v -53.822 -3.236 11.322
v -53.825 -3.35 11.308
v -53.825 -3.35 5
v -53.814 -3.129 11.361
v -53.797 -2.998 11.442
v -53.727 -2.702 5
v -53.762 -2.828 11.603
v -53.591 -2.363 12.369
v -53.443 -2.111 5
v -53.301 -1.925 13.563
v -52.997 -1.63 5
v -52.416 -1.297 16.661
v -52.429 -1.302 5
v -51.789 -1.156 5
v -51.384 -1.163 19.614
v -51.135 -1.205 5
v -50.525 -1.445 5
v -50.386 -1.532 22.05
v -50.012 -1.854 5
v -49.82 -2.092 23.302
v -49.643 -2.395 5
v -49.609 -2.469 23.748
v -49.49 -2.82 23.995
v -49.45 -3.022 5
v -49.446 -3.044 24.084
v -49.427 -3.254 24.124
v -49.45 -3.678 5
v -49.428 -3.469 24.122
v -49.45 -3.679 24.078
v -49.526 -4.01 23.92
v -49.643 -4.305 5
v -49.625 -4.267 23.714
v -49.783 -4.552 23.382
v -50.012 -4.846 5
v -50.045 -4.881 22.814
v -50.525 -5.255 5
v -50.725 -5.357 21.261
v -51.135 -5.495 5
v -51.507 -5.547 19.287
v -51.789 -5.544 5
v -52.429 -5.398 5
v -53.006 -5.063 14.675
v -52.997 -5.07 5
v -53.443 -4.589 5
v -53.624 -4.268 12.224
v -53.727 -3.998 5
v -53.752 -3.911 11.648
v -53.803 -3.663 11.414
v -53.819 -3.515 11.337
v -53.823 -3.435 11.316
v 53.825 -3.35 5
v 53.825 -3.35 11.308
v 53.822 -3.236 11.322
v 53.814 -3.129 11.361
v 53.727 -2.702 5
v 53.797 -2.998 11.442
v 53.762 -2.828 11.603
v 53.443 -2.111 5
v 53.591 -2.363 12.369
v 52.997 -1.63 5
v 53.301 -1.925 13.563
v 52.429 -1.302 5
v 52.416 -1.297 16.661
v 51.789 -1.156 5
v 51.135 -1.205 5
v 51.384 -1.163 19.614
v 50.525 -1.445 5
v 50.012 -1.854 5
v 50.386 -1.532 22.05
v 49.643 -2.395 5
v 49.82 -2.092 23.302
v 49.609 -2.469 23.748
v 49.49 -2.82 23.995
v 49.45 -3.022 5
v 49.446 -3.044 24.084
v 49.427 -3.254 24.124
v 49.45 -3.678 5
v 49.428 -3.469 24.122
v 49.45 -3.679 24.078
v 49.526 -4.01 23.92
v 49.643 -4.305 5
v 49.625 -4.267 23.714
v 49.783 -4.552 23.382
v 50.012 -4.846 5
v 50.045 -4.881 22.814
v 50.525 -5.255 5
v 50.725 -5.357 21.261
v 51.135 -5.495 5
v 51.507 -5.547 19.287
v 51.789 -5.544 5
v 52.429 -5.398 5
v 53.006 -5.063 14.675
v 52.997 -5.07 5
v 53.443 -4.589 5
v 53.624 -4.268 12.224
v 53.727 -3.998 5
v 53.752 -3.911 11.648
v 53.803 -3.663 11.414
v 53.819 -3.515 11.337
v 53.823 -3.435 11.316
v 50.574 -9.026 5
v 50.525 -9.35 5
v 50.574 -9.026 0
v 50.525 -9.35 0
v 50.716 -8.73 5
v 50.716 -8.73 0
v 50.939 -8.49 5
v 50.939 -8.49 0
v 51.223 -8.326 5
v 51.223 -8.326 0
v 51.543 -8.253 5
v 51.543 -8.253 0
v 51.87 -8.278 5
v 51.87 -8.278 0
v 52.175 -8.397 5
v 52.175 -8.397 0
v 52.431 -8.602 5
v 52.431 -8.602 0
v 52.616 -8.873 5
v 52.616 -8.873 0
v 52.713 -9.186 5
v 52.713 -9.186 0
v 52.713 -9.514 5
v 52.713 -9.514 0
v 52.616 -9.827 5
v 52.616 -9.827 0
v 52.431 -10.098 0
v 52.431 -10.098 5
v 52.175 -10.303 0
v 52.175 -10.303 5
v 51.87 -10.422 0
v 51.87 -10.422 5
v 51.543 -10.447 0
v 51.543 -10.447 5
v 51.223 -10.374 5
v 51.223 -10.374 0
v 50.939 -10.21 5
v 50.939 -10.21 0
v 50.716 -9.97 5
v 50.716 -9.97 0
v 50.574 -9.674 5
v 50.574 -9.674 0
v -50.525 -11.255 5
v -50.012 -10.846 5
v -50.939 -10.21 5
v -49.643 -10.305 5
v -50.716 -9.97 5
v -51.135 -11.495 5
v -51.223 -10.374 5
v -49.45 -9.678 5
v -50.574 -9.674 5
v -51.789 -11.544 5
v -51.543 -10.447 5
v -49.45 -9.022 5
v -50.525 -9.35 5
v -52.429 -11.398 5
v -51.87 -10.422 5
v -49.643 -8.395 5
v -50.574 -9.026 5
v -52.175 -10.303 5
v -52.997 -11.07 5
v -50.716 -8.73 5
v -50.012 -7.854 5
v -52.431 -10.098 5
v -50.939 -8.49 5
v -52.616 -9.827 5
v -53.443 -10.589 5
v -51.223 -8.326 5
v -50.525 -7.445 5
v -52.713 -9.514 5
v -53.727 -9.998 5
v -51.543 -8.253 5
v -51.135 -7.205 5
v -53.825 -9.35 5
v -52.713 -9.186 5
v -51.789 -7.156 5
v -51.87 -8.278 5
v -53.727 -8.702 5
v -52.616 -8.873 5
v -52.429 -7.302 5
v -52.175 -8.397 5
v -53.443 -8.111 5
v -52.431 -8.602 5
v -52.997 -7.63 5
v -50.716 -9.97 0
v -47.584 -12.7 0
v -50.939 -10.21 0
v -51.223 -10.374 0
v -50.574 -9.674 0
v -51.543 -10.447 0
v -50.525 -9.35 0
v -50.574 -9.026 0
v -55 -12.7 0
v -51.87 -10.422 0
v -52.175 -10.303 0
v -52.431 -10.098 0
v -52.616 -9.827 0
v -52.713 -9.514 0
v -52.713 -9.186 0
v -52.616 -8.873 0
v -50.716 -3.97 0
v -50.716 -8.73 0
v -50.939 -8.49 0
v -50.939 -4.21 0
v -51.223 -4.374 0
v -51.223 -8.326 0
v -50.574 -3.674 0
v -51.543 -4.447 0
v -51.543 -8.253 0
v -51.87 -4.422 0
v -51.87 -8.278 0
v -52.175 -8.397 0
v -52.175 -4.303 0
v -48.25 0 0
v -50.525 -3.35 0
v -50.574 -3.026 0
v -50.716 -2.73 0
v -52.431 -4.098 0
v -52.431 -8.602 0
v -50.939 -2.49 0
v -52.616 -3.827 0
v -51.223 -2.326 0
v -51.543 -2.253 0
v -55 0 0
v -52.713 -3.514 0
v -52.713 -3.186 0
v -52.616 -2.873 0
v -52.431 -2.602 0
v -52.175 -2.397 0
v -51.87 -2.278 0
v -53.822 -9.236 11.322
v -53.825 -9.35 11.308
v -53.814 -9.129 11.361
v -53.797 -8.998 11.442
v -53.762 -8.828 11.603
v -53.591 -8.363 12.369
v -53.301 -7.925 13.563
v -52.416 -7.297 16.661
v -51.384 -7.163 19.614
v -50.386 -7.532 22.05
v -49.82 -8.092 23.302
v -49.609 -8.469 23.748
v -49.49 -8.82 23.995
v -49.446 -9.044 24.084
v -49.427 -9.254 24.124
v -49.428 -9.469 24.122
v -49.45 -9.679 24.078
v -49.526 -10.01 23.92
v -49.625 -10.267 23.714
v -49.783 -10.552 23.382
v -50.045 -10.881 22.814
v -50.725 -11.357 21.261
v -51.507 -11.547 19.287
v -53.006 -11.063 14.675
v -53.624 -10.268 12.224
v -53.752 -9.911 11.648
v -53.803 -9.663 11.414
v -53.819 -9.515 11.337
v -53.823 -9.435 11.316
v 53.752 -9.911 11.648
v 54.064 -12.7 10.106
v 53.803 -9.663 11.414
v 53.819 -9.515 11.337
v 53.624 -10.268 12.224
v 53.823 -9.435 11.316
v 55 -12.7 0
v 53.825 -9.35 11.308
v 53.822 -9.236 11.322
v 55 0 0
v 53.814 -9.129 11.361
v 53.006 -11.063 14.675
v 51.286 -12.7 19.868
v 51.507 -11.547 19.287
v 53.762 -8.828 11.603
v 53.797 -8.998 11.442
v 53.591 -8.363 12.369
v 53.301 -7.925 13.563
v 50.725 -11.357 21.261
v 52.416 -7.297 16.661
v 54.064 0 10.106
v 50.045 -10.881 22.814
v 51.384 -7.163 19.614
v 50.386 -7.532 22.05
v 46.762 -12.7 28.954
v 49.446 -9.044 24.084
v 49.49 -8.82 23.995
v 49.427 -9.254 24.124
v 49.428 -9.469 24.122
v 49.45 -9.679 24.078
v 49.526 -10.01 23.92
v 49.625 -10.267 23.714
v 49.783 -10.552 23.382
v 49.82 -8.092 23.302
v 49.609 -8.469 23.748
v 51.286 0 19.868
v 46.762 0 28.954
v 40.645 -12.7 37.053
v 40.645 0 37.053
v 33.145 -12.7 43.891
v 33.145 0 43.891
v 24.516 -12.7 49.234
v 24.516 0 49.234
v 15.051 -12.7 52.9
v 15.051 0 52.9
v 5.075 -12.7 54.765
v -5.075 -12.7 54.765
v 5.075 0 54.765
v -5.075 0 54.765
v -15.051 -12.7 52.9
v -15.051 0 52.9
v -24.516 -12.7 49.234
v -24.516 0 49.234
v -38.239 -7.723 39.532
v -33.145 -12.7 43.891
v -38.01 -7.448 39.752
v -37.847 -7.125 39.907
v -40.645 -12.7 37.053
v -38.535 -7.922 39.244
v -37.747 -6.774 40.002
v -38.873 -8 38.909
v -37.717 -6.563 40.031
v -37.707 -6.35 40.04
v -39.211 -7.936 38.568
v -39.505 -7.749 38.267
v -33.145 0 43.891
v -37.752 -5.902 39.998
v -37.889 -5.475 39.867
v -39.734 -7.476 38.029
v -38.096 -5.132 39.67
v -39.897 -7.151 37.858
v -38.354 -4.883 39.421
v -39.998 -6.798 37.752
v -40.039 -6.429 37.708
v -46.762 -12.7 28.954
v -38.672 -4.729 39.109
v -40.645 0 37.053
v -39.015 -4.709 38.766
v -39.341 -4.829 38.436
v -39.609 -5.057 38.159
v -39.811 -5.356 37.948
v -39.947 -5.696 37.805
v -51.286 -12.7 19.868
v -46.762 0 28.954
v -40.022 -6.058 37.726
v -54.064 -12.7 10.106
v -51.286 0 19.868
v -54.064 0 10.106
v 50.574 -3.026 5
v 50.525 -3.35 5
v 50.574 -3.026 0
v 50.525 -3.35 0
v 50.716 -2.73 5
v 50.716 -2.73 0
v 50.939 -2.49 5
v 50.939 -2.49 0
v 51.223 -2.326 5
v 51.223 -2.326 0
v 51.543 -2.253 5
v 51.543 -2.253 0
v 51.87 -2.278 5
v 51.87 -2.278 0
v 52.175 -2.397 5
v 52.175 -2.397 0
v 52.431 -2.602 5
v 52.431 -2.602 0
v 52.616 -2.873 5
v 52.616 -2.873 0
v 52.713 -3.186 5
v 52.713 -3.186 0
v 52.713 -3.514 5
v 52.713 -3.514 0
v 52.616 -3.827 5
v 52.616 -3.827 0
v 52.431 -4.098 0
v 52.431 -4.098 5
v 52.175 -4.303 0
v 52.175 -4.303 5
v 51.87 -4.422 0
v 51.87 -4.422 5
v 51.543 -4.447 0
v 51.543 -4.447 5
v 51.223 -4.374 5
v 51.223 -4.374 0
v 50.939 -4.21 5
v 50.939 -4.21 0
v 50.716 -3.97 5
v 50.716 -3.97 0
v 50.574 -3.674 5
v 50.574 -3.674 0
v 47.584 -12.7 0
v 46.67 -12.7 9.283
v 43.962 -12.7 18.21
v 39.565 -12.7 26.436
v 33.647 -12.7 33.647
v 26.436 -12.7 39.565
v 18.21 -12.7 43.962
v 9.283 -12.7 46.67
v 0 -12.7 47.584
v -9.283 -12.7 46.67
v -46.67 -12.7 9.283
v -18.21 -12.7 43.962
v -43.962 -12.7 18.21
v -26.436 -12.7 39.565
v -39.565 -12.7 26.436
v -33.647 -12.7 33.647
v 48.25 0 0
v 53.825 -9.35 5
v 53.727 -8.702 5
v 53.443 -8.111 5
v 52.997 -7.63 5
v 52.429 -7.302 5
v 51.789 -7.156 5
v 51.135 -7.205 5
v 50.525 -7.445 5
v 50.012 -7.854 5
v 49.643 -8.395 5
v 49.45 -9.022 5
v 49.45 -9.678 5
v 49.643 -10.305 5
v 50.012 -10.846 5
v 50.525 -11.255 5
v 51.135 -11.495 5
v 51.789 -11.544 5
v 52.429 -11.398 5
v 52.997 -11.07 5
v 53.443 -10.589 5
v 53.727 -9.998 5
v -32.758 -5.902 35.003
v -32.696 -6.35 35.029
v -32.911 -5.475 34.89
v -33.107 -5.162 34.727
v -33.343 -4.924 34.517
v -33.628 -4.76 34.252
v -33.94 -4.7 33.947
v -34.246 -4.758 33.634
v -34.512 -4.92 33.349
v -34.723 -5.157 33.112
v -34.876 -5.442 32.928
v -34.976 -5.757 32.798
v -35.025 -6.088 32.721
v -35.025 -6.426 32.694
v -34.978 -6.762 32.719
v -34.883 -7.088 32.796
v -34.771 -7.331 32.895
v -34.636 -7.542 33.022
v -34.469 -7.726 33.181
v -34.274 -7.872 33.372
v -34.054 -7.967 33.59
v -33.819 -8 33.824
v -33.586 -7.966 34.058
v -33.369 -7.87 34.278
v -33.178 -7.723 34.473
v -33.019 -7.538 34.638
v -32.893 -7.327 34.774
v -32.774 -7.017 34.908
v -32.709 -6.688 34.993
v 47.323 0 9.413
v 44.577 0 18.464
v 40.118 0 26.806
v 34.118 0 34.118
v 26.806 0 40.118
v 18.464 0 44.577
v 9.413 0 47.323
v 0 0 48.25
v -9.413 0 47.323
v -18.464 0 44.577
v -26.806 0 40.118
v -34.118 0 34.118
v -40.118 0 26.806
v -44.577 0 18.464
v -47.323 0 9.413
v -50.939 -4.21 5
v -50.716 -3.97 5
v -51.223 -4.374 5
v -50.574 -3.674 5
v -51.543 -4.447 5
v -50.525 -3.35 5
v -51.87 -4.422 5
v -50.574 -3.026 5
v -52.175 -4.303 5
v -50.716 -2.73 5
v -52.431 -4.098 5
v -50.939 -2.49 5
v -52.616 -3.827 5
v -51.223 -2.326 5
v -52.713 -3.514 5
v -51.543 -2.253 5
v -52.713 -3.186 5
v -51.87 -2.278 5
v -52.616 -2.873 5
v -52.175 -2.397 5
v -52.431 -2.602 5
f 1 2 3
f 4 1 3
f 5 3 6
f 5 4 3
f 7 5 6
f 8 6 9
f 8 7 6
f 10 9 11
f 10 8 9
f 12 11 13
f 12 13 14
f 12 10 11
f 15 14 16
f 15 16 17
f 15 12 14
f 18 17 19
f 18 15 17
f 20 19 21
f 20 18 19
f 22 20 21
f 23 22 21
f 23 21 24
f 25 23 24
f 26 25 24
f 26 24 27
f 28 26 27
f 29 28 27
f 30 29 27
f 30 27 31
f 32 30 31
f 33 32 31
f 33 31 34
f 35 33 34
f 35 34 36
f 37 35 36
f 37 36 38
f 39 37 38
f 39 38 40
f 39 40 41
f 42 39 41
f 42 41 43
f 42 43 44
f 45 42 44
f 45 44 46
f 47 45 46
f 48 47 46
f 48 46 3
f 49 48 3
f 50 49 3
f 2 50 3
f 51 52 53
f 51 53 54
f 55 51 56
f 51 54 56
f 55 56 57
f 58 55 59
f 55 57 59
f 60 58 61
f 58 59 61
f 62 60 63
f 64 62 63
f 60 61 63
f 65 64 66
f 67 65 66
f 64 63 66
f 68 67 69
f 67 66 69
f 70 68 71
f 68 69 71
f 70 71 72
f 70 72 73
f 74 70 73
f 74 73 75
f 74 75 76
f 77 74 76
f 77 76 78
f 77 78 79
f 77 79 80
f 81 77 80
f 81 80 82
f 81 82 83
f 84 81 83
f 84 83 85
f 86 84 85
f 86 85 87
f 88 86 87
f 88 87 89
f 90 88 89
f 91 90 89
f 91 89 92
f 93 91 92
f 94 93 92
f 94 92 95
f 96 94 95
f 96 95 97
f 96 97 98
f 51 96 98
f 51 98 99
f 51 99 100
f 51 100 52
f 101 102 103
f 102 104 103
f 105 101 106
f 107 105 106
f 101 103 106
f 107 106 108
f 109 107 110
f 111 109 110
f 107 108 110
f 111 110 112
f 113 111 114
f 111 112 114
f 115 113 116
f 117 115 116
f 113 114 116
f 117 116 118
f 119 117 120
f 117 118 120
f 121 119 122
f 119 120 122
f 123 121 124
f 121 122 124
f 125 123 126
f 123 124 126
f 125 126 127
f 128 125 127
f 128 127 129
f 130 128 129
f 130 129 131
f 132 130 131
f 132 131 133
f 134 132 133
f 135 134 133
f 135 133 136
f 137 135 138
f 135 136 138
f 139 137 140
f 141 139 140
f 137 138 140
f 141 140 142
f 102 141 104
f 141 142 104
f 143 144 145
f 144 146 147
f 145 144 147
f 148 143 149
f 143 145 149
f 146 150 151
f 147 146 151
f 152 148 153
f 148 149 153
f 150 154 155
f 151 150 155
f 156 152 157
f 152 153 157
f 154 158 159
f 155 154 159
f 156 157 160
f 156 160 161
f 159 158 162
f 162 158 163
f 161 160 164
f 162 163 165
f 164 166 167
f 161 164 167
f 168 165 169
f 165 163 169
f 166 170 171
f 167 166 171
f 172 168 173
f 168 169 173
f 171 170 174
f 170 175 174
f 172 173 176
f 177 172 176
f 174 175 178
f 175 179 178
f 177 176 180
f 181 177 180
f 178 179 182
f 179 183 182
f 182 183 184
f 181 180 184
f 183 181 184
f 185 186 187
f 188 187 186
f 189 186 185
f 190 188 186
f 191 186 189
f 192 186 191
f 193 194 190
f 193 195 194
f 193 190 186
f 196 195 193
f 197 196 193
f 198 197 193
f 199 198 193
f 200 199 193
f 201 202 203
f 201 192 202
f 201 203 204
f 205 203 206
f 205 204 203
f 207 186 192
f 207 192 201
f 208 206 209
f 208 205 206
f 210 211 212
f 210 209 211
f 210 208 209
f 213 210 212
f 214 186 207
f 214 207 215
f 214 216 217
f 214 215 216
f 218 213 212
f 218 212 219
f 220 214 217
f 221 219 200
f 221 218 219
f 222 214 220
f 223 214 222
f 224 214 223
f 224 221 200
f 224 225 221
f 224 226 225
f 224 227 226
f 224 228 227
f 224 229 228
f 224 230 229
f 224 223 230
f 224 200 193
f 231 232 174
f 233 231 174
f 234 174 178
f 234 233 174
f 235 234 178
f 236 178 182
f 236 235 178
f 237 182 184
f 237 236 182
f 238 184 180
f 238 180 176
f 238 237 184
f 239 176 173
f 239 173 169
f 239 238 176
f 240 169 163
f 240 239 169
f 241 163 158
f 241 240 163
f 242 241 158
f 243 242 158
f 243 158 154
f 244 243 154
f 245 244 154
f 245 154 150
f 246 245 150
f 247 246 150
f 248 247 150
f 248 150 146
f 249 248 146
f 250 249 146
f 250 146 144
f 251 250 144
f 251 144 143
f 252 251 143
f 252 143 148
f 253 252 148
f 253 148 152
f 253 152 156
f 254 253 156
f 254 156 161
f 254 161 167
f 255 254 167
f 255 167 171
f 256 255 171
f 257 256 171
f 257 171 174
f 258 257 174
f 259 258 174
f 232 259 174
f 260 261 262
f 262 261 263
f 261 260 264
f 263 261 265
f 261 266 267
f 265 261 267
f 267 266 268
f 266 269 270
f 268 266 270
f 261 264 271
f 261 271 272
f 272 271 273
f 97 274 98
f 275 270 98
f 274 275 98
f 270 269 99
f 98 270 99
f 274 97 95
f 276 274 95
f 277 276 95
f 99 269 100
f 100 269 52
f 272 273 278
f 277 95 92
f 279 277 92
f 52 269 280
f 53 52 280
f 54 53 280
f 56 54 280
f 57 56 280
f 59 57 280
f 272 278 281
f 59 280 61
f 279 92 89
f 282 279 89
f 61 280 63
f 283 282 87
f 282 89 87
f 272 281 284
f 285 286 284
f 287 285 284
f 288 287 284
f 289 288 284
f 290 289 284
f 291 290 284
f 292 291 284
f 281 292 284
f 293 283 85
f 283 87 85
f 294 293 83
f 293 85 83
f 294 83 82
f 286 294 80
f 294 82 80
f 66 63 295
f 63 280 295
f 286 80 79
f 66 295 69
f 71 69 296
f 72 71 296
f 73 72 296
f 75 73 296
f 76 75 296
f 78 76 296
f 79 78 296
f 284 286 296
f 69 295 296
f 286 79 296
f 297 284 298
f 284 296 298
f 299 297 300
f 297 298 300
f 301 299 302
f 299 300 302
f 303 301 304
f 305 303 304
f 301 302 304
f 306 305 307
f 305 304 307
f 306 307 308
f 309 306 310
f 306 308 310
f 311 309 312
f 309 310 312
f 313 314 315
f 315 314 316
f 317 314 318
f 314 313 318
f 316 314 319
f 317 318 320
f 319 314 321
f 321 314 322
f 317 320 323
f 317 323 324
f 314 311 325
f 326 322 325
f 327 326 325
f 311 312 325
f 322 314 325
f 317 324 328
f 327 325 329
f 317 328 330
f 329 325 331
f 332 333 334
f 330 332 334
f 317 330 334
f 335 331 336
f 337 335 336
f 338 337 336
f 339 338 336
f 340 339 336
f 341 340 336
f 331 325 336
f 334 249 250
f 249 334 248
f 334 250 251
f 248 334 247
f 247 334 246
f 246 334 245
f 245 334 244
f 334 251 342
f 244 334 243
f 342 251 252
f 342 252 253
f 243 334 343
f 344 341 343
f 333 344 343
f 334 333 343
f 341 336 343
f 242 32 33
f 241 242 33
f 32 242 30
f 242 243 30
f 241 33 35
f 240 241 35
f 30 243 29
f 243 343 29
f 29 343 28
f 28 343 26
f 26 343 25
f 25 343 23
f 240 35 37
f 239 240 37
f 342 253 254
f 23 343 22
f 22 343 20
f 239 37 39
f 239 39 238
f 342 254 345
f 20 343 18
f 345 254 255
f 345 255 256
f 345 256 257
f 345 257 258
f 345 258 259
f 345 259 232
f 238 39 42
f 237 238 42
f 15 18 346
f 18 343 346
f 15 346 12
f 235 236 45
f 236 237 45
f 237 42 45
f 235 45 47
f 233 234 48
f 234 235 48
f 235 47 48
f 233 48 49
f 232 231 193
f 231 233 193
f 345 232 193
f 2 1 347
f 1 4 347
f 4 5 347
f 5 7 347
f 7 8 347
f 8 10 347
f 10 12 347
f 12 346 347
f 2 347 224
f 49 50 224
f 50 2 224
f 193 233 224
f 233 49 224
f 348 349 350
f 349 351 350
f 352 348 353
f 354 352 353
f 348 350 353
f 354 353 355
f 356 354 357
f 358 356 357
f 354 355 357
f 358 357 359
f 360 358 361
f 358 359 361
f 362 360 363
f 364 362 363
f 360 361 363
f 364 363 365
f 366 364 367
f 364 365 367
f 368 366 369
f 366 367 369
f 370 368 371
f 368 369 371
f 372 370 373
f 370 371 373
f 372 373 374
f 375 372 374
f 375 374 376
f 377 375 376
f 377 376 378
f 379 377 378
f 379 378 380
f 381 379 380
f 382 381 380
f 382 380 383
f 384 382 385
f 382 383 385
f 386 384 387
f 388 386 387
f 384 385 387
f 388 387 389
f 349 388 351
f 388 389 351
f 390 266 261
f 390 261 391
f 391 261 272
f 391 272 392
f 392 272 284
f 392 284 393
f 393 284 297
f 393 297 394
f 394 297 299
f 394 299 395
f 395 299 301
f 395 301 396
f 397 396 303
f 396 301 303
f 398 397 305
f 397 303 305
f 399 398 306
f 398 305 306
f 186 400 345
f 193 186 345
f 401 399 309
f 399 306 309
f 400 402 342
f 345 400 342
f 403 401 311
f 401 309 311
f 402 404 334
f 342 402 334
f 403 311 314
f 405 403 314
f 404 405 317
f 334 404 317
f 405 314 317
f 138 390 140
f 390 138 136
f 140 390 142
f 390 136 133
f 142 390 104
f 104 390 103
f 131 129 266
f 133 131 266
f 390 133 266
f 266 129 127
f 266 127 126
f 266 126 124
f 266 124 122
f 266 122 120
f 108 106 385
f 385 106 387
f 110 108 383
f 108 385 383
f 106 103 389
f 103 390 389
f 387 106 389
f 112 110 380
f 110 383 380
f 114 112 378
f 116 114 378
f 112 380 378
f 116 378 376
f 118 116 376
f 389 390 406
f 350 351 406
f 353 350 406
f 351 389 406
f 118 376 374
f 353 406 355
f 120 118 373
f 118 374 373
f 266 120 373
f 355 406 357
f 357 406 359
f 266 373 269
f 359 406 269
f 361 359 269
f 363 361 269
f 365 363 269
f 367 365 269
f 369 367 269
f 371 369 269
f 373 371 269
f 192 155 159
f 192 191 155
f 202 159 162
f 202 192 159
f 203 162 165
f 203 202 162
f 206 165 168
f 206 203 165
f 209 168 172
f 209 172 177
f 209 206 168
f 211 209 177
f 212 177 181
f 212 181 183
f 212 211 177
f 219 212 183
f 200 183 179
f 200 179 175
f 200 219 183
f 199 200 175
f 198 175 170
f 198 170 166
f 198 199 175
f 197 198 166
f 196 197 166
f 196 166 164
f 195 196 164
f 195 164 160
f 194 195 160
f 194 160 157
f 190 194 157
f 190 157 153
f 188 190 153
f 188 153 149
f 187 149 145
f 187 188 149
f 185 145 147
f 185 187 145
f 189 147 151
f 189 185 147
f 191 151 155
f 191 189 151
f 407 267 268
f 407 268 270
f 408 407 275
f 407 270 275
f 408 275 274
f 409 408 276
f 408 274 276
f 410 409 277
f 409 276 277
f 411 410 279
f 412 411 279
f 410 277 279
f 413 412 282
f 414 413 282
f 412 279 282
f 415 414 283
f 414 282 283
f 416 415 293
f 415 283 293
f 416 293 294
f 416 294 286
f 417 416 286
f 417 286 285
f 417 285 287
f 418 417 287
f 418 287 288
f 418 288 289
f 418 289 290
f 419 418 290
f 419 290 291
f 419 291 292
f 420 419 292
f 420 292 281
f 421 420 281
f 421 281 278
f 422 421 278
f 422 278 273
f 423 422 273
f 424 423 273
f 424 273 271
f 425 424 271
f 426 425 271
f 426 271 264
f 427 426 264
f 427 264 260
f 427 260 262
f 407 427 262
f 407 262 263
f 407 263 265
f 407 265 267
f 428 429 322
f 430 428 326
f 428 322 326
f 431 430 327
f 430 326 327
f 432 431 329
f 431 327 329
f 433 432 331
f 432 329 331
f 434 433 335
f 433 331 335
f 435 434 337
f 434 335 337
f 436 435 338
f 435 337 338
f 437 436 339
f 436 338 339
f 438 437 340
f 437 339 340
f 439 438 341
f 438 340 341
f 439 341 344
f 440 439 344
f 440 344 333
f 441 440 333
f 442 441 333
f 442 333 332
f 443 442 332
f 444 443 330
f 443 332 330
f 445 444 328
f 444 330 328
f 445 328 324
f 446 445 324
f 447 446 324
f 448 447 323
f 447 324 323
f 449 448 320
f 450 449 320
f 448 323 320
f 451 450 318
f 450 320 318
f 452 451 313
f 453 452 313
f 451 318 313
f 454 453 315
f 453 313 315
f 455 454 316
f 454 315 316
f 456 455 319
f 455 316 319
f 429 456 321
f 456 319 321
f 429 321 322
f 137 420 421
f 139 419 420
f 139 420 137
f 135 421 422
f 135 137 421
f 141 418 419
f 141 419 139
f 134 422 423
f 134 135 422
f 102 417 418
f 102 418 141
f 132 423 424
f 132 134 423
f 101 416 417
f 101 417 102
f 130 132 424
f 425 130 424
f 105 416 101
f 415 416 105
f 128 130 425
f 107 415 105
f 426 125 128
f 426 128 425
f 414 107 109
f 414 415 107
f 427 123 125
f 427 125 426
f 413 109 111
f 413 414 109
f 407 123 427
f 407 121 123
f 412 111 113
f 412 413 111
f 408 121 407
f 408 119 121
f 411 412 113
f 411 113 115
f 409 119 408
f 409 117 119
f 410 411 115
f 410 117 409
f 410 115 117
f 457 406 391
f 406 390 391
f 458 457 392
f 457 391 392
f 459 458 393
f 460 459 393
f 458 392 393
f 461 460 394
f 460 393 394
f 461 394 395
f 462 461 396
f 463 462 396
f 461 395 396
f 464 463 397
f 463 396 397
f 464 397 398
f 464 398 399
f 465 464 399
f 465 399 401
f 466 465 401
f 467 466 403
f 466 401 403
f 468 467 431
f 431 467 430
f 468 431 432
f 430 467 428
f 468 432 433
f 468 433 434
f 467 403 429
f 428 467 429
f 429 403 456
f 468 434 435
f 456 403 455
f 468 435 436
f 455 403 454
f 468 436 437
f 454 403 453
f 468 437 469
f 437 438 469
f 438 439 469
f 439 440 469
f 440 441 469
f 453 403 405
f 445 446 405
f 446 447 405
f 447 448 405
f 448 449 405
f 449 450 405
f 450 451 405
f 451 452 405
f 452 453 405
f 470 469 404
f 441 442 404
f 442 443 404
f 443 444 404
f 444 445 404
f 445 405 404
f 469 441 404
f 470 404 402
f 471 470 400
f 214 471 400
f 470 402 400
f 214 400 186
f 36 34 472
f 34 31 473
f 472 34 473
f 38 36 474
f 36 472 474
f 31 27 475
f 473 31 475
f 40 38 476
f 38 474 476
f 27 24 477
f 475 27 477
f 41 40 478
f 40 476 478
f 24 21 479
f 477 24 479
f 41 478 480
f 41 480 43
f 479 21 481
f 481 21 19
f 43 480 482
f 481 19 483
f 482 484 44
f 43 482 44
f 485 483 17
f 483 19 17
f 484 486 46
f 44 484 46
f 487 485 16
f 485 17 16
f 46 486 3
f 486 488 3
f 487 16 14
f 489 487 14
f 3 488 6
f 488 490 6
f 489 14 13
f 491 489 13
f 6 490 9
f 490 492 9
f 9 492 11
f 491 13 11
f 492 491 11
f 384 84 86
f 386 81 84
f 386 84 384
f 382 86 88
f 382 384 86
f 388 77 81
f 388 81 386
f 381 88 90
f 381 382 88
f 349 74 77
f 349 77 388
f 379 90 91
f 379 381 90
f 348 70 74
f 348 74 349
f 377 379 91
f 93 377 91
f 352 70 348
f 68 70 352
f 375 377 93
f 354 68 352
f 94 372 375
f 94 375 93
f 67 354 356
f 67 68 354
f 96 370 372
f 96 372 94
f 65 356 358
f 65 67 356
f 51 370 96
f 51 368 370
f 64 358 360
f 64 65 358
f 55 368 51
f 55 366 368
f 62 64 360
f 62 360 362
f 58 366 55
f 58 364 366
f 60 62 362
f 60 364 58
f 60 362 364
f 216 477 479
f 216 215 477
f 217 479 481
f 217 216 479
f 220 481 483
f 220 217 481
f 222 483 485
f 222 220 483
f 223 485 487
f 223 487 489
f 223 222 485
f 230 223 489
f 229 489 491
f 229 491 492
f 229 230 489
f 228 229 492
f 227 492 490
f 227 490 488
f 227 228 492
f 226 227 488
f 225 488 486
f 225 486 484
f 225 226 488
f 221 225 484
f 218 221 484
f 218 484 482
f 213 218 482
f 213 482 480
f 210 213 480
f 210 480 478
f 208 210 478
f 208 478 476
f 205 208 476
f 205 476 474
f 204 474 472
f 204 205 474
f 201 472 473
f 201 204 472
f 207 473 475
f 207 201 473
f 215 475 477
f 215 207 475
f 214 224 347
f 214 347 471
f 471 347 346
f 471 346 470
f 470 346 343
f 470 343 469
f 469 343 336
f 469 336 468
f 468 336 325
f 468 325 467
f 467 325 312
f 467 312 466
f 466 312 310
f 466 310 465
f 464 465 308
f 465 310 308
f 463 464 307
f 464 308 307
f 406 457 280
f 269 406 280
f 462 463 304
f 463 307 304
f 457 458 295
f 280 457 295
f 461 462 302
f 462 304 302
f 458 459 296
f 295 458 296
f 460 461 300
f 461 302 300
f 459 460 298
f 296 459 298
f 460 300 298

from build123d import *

# Parameters (mm, degrees)
REVOLVE2_ANGLE                 = 180
CBORE_FOR_M2_SHCS1_D           = 2.2
CBORE_FOR_M2_SHCS1_CBORE_D     = 4.4
CBORE_FOR_M2_SHCS1_CBORE_DEPTH = 50
SKETCH13_R                     = 1.65
CUT_EXTRUDE2_DEPTH             = 100


with BuildPart() as part:
    # Sketch3 → Revolve2 (revolve)
    with BuildSketch(Plane.XY):
        Polygon((48.25, 0), (47.584421203, -12.7), (55, -12.7), (55, 0), align=None)
    revolve(axis=Axis((0, 50.355486862, 0), (0, -1, 0)), revolution_arc=REVOLVE2_ANGLE)

    # CBORE for M2 SHCS1 (through all)
    with Locations(Plane.XY.offset(55)):
        with Locations((51.625, -3.35), (51.625, -9.35)):
            cbore_for_m2_shcs1 = CounterBoreHole(CBORE_FOR_M2_SHCS1_D / 2, CBORE_FOR_M2_SHCS1_CBORE_D / 2, CBORE_FOR_M2_SHCS1_CBORE_DEPTH)

    # Mirror1: CBORE for M2 SHCS1 across plane
    add(cbore_for_m2_shcs1.mirror(Plane(origin=(0, 0, 0), x_dir=(0, 0, 1), z_dir=(1, 0, 0))), mode=Mode.SUBTRACT)

    # Sketch13 → Cut-Extrude2 (cut, symmetric)
    with BuildSketch(Plane(origin=(0, 0, 0), x_dir=(0.707106781, 0, 0.707106781), z_dir=(-0.707106781, 0, 0.707106781))):
        with Locations((0, -6.35)):
            Circle(SKETCH13_R)
    extrude(amount=CUT_EXTRUDE2_DEPTH, both=True, mode=Mode.SUBTRACT)


solid = part.part
